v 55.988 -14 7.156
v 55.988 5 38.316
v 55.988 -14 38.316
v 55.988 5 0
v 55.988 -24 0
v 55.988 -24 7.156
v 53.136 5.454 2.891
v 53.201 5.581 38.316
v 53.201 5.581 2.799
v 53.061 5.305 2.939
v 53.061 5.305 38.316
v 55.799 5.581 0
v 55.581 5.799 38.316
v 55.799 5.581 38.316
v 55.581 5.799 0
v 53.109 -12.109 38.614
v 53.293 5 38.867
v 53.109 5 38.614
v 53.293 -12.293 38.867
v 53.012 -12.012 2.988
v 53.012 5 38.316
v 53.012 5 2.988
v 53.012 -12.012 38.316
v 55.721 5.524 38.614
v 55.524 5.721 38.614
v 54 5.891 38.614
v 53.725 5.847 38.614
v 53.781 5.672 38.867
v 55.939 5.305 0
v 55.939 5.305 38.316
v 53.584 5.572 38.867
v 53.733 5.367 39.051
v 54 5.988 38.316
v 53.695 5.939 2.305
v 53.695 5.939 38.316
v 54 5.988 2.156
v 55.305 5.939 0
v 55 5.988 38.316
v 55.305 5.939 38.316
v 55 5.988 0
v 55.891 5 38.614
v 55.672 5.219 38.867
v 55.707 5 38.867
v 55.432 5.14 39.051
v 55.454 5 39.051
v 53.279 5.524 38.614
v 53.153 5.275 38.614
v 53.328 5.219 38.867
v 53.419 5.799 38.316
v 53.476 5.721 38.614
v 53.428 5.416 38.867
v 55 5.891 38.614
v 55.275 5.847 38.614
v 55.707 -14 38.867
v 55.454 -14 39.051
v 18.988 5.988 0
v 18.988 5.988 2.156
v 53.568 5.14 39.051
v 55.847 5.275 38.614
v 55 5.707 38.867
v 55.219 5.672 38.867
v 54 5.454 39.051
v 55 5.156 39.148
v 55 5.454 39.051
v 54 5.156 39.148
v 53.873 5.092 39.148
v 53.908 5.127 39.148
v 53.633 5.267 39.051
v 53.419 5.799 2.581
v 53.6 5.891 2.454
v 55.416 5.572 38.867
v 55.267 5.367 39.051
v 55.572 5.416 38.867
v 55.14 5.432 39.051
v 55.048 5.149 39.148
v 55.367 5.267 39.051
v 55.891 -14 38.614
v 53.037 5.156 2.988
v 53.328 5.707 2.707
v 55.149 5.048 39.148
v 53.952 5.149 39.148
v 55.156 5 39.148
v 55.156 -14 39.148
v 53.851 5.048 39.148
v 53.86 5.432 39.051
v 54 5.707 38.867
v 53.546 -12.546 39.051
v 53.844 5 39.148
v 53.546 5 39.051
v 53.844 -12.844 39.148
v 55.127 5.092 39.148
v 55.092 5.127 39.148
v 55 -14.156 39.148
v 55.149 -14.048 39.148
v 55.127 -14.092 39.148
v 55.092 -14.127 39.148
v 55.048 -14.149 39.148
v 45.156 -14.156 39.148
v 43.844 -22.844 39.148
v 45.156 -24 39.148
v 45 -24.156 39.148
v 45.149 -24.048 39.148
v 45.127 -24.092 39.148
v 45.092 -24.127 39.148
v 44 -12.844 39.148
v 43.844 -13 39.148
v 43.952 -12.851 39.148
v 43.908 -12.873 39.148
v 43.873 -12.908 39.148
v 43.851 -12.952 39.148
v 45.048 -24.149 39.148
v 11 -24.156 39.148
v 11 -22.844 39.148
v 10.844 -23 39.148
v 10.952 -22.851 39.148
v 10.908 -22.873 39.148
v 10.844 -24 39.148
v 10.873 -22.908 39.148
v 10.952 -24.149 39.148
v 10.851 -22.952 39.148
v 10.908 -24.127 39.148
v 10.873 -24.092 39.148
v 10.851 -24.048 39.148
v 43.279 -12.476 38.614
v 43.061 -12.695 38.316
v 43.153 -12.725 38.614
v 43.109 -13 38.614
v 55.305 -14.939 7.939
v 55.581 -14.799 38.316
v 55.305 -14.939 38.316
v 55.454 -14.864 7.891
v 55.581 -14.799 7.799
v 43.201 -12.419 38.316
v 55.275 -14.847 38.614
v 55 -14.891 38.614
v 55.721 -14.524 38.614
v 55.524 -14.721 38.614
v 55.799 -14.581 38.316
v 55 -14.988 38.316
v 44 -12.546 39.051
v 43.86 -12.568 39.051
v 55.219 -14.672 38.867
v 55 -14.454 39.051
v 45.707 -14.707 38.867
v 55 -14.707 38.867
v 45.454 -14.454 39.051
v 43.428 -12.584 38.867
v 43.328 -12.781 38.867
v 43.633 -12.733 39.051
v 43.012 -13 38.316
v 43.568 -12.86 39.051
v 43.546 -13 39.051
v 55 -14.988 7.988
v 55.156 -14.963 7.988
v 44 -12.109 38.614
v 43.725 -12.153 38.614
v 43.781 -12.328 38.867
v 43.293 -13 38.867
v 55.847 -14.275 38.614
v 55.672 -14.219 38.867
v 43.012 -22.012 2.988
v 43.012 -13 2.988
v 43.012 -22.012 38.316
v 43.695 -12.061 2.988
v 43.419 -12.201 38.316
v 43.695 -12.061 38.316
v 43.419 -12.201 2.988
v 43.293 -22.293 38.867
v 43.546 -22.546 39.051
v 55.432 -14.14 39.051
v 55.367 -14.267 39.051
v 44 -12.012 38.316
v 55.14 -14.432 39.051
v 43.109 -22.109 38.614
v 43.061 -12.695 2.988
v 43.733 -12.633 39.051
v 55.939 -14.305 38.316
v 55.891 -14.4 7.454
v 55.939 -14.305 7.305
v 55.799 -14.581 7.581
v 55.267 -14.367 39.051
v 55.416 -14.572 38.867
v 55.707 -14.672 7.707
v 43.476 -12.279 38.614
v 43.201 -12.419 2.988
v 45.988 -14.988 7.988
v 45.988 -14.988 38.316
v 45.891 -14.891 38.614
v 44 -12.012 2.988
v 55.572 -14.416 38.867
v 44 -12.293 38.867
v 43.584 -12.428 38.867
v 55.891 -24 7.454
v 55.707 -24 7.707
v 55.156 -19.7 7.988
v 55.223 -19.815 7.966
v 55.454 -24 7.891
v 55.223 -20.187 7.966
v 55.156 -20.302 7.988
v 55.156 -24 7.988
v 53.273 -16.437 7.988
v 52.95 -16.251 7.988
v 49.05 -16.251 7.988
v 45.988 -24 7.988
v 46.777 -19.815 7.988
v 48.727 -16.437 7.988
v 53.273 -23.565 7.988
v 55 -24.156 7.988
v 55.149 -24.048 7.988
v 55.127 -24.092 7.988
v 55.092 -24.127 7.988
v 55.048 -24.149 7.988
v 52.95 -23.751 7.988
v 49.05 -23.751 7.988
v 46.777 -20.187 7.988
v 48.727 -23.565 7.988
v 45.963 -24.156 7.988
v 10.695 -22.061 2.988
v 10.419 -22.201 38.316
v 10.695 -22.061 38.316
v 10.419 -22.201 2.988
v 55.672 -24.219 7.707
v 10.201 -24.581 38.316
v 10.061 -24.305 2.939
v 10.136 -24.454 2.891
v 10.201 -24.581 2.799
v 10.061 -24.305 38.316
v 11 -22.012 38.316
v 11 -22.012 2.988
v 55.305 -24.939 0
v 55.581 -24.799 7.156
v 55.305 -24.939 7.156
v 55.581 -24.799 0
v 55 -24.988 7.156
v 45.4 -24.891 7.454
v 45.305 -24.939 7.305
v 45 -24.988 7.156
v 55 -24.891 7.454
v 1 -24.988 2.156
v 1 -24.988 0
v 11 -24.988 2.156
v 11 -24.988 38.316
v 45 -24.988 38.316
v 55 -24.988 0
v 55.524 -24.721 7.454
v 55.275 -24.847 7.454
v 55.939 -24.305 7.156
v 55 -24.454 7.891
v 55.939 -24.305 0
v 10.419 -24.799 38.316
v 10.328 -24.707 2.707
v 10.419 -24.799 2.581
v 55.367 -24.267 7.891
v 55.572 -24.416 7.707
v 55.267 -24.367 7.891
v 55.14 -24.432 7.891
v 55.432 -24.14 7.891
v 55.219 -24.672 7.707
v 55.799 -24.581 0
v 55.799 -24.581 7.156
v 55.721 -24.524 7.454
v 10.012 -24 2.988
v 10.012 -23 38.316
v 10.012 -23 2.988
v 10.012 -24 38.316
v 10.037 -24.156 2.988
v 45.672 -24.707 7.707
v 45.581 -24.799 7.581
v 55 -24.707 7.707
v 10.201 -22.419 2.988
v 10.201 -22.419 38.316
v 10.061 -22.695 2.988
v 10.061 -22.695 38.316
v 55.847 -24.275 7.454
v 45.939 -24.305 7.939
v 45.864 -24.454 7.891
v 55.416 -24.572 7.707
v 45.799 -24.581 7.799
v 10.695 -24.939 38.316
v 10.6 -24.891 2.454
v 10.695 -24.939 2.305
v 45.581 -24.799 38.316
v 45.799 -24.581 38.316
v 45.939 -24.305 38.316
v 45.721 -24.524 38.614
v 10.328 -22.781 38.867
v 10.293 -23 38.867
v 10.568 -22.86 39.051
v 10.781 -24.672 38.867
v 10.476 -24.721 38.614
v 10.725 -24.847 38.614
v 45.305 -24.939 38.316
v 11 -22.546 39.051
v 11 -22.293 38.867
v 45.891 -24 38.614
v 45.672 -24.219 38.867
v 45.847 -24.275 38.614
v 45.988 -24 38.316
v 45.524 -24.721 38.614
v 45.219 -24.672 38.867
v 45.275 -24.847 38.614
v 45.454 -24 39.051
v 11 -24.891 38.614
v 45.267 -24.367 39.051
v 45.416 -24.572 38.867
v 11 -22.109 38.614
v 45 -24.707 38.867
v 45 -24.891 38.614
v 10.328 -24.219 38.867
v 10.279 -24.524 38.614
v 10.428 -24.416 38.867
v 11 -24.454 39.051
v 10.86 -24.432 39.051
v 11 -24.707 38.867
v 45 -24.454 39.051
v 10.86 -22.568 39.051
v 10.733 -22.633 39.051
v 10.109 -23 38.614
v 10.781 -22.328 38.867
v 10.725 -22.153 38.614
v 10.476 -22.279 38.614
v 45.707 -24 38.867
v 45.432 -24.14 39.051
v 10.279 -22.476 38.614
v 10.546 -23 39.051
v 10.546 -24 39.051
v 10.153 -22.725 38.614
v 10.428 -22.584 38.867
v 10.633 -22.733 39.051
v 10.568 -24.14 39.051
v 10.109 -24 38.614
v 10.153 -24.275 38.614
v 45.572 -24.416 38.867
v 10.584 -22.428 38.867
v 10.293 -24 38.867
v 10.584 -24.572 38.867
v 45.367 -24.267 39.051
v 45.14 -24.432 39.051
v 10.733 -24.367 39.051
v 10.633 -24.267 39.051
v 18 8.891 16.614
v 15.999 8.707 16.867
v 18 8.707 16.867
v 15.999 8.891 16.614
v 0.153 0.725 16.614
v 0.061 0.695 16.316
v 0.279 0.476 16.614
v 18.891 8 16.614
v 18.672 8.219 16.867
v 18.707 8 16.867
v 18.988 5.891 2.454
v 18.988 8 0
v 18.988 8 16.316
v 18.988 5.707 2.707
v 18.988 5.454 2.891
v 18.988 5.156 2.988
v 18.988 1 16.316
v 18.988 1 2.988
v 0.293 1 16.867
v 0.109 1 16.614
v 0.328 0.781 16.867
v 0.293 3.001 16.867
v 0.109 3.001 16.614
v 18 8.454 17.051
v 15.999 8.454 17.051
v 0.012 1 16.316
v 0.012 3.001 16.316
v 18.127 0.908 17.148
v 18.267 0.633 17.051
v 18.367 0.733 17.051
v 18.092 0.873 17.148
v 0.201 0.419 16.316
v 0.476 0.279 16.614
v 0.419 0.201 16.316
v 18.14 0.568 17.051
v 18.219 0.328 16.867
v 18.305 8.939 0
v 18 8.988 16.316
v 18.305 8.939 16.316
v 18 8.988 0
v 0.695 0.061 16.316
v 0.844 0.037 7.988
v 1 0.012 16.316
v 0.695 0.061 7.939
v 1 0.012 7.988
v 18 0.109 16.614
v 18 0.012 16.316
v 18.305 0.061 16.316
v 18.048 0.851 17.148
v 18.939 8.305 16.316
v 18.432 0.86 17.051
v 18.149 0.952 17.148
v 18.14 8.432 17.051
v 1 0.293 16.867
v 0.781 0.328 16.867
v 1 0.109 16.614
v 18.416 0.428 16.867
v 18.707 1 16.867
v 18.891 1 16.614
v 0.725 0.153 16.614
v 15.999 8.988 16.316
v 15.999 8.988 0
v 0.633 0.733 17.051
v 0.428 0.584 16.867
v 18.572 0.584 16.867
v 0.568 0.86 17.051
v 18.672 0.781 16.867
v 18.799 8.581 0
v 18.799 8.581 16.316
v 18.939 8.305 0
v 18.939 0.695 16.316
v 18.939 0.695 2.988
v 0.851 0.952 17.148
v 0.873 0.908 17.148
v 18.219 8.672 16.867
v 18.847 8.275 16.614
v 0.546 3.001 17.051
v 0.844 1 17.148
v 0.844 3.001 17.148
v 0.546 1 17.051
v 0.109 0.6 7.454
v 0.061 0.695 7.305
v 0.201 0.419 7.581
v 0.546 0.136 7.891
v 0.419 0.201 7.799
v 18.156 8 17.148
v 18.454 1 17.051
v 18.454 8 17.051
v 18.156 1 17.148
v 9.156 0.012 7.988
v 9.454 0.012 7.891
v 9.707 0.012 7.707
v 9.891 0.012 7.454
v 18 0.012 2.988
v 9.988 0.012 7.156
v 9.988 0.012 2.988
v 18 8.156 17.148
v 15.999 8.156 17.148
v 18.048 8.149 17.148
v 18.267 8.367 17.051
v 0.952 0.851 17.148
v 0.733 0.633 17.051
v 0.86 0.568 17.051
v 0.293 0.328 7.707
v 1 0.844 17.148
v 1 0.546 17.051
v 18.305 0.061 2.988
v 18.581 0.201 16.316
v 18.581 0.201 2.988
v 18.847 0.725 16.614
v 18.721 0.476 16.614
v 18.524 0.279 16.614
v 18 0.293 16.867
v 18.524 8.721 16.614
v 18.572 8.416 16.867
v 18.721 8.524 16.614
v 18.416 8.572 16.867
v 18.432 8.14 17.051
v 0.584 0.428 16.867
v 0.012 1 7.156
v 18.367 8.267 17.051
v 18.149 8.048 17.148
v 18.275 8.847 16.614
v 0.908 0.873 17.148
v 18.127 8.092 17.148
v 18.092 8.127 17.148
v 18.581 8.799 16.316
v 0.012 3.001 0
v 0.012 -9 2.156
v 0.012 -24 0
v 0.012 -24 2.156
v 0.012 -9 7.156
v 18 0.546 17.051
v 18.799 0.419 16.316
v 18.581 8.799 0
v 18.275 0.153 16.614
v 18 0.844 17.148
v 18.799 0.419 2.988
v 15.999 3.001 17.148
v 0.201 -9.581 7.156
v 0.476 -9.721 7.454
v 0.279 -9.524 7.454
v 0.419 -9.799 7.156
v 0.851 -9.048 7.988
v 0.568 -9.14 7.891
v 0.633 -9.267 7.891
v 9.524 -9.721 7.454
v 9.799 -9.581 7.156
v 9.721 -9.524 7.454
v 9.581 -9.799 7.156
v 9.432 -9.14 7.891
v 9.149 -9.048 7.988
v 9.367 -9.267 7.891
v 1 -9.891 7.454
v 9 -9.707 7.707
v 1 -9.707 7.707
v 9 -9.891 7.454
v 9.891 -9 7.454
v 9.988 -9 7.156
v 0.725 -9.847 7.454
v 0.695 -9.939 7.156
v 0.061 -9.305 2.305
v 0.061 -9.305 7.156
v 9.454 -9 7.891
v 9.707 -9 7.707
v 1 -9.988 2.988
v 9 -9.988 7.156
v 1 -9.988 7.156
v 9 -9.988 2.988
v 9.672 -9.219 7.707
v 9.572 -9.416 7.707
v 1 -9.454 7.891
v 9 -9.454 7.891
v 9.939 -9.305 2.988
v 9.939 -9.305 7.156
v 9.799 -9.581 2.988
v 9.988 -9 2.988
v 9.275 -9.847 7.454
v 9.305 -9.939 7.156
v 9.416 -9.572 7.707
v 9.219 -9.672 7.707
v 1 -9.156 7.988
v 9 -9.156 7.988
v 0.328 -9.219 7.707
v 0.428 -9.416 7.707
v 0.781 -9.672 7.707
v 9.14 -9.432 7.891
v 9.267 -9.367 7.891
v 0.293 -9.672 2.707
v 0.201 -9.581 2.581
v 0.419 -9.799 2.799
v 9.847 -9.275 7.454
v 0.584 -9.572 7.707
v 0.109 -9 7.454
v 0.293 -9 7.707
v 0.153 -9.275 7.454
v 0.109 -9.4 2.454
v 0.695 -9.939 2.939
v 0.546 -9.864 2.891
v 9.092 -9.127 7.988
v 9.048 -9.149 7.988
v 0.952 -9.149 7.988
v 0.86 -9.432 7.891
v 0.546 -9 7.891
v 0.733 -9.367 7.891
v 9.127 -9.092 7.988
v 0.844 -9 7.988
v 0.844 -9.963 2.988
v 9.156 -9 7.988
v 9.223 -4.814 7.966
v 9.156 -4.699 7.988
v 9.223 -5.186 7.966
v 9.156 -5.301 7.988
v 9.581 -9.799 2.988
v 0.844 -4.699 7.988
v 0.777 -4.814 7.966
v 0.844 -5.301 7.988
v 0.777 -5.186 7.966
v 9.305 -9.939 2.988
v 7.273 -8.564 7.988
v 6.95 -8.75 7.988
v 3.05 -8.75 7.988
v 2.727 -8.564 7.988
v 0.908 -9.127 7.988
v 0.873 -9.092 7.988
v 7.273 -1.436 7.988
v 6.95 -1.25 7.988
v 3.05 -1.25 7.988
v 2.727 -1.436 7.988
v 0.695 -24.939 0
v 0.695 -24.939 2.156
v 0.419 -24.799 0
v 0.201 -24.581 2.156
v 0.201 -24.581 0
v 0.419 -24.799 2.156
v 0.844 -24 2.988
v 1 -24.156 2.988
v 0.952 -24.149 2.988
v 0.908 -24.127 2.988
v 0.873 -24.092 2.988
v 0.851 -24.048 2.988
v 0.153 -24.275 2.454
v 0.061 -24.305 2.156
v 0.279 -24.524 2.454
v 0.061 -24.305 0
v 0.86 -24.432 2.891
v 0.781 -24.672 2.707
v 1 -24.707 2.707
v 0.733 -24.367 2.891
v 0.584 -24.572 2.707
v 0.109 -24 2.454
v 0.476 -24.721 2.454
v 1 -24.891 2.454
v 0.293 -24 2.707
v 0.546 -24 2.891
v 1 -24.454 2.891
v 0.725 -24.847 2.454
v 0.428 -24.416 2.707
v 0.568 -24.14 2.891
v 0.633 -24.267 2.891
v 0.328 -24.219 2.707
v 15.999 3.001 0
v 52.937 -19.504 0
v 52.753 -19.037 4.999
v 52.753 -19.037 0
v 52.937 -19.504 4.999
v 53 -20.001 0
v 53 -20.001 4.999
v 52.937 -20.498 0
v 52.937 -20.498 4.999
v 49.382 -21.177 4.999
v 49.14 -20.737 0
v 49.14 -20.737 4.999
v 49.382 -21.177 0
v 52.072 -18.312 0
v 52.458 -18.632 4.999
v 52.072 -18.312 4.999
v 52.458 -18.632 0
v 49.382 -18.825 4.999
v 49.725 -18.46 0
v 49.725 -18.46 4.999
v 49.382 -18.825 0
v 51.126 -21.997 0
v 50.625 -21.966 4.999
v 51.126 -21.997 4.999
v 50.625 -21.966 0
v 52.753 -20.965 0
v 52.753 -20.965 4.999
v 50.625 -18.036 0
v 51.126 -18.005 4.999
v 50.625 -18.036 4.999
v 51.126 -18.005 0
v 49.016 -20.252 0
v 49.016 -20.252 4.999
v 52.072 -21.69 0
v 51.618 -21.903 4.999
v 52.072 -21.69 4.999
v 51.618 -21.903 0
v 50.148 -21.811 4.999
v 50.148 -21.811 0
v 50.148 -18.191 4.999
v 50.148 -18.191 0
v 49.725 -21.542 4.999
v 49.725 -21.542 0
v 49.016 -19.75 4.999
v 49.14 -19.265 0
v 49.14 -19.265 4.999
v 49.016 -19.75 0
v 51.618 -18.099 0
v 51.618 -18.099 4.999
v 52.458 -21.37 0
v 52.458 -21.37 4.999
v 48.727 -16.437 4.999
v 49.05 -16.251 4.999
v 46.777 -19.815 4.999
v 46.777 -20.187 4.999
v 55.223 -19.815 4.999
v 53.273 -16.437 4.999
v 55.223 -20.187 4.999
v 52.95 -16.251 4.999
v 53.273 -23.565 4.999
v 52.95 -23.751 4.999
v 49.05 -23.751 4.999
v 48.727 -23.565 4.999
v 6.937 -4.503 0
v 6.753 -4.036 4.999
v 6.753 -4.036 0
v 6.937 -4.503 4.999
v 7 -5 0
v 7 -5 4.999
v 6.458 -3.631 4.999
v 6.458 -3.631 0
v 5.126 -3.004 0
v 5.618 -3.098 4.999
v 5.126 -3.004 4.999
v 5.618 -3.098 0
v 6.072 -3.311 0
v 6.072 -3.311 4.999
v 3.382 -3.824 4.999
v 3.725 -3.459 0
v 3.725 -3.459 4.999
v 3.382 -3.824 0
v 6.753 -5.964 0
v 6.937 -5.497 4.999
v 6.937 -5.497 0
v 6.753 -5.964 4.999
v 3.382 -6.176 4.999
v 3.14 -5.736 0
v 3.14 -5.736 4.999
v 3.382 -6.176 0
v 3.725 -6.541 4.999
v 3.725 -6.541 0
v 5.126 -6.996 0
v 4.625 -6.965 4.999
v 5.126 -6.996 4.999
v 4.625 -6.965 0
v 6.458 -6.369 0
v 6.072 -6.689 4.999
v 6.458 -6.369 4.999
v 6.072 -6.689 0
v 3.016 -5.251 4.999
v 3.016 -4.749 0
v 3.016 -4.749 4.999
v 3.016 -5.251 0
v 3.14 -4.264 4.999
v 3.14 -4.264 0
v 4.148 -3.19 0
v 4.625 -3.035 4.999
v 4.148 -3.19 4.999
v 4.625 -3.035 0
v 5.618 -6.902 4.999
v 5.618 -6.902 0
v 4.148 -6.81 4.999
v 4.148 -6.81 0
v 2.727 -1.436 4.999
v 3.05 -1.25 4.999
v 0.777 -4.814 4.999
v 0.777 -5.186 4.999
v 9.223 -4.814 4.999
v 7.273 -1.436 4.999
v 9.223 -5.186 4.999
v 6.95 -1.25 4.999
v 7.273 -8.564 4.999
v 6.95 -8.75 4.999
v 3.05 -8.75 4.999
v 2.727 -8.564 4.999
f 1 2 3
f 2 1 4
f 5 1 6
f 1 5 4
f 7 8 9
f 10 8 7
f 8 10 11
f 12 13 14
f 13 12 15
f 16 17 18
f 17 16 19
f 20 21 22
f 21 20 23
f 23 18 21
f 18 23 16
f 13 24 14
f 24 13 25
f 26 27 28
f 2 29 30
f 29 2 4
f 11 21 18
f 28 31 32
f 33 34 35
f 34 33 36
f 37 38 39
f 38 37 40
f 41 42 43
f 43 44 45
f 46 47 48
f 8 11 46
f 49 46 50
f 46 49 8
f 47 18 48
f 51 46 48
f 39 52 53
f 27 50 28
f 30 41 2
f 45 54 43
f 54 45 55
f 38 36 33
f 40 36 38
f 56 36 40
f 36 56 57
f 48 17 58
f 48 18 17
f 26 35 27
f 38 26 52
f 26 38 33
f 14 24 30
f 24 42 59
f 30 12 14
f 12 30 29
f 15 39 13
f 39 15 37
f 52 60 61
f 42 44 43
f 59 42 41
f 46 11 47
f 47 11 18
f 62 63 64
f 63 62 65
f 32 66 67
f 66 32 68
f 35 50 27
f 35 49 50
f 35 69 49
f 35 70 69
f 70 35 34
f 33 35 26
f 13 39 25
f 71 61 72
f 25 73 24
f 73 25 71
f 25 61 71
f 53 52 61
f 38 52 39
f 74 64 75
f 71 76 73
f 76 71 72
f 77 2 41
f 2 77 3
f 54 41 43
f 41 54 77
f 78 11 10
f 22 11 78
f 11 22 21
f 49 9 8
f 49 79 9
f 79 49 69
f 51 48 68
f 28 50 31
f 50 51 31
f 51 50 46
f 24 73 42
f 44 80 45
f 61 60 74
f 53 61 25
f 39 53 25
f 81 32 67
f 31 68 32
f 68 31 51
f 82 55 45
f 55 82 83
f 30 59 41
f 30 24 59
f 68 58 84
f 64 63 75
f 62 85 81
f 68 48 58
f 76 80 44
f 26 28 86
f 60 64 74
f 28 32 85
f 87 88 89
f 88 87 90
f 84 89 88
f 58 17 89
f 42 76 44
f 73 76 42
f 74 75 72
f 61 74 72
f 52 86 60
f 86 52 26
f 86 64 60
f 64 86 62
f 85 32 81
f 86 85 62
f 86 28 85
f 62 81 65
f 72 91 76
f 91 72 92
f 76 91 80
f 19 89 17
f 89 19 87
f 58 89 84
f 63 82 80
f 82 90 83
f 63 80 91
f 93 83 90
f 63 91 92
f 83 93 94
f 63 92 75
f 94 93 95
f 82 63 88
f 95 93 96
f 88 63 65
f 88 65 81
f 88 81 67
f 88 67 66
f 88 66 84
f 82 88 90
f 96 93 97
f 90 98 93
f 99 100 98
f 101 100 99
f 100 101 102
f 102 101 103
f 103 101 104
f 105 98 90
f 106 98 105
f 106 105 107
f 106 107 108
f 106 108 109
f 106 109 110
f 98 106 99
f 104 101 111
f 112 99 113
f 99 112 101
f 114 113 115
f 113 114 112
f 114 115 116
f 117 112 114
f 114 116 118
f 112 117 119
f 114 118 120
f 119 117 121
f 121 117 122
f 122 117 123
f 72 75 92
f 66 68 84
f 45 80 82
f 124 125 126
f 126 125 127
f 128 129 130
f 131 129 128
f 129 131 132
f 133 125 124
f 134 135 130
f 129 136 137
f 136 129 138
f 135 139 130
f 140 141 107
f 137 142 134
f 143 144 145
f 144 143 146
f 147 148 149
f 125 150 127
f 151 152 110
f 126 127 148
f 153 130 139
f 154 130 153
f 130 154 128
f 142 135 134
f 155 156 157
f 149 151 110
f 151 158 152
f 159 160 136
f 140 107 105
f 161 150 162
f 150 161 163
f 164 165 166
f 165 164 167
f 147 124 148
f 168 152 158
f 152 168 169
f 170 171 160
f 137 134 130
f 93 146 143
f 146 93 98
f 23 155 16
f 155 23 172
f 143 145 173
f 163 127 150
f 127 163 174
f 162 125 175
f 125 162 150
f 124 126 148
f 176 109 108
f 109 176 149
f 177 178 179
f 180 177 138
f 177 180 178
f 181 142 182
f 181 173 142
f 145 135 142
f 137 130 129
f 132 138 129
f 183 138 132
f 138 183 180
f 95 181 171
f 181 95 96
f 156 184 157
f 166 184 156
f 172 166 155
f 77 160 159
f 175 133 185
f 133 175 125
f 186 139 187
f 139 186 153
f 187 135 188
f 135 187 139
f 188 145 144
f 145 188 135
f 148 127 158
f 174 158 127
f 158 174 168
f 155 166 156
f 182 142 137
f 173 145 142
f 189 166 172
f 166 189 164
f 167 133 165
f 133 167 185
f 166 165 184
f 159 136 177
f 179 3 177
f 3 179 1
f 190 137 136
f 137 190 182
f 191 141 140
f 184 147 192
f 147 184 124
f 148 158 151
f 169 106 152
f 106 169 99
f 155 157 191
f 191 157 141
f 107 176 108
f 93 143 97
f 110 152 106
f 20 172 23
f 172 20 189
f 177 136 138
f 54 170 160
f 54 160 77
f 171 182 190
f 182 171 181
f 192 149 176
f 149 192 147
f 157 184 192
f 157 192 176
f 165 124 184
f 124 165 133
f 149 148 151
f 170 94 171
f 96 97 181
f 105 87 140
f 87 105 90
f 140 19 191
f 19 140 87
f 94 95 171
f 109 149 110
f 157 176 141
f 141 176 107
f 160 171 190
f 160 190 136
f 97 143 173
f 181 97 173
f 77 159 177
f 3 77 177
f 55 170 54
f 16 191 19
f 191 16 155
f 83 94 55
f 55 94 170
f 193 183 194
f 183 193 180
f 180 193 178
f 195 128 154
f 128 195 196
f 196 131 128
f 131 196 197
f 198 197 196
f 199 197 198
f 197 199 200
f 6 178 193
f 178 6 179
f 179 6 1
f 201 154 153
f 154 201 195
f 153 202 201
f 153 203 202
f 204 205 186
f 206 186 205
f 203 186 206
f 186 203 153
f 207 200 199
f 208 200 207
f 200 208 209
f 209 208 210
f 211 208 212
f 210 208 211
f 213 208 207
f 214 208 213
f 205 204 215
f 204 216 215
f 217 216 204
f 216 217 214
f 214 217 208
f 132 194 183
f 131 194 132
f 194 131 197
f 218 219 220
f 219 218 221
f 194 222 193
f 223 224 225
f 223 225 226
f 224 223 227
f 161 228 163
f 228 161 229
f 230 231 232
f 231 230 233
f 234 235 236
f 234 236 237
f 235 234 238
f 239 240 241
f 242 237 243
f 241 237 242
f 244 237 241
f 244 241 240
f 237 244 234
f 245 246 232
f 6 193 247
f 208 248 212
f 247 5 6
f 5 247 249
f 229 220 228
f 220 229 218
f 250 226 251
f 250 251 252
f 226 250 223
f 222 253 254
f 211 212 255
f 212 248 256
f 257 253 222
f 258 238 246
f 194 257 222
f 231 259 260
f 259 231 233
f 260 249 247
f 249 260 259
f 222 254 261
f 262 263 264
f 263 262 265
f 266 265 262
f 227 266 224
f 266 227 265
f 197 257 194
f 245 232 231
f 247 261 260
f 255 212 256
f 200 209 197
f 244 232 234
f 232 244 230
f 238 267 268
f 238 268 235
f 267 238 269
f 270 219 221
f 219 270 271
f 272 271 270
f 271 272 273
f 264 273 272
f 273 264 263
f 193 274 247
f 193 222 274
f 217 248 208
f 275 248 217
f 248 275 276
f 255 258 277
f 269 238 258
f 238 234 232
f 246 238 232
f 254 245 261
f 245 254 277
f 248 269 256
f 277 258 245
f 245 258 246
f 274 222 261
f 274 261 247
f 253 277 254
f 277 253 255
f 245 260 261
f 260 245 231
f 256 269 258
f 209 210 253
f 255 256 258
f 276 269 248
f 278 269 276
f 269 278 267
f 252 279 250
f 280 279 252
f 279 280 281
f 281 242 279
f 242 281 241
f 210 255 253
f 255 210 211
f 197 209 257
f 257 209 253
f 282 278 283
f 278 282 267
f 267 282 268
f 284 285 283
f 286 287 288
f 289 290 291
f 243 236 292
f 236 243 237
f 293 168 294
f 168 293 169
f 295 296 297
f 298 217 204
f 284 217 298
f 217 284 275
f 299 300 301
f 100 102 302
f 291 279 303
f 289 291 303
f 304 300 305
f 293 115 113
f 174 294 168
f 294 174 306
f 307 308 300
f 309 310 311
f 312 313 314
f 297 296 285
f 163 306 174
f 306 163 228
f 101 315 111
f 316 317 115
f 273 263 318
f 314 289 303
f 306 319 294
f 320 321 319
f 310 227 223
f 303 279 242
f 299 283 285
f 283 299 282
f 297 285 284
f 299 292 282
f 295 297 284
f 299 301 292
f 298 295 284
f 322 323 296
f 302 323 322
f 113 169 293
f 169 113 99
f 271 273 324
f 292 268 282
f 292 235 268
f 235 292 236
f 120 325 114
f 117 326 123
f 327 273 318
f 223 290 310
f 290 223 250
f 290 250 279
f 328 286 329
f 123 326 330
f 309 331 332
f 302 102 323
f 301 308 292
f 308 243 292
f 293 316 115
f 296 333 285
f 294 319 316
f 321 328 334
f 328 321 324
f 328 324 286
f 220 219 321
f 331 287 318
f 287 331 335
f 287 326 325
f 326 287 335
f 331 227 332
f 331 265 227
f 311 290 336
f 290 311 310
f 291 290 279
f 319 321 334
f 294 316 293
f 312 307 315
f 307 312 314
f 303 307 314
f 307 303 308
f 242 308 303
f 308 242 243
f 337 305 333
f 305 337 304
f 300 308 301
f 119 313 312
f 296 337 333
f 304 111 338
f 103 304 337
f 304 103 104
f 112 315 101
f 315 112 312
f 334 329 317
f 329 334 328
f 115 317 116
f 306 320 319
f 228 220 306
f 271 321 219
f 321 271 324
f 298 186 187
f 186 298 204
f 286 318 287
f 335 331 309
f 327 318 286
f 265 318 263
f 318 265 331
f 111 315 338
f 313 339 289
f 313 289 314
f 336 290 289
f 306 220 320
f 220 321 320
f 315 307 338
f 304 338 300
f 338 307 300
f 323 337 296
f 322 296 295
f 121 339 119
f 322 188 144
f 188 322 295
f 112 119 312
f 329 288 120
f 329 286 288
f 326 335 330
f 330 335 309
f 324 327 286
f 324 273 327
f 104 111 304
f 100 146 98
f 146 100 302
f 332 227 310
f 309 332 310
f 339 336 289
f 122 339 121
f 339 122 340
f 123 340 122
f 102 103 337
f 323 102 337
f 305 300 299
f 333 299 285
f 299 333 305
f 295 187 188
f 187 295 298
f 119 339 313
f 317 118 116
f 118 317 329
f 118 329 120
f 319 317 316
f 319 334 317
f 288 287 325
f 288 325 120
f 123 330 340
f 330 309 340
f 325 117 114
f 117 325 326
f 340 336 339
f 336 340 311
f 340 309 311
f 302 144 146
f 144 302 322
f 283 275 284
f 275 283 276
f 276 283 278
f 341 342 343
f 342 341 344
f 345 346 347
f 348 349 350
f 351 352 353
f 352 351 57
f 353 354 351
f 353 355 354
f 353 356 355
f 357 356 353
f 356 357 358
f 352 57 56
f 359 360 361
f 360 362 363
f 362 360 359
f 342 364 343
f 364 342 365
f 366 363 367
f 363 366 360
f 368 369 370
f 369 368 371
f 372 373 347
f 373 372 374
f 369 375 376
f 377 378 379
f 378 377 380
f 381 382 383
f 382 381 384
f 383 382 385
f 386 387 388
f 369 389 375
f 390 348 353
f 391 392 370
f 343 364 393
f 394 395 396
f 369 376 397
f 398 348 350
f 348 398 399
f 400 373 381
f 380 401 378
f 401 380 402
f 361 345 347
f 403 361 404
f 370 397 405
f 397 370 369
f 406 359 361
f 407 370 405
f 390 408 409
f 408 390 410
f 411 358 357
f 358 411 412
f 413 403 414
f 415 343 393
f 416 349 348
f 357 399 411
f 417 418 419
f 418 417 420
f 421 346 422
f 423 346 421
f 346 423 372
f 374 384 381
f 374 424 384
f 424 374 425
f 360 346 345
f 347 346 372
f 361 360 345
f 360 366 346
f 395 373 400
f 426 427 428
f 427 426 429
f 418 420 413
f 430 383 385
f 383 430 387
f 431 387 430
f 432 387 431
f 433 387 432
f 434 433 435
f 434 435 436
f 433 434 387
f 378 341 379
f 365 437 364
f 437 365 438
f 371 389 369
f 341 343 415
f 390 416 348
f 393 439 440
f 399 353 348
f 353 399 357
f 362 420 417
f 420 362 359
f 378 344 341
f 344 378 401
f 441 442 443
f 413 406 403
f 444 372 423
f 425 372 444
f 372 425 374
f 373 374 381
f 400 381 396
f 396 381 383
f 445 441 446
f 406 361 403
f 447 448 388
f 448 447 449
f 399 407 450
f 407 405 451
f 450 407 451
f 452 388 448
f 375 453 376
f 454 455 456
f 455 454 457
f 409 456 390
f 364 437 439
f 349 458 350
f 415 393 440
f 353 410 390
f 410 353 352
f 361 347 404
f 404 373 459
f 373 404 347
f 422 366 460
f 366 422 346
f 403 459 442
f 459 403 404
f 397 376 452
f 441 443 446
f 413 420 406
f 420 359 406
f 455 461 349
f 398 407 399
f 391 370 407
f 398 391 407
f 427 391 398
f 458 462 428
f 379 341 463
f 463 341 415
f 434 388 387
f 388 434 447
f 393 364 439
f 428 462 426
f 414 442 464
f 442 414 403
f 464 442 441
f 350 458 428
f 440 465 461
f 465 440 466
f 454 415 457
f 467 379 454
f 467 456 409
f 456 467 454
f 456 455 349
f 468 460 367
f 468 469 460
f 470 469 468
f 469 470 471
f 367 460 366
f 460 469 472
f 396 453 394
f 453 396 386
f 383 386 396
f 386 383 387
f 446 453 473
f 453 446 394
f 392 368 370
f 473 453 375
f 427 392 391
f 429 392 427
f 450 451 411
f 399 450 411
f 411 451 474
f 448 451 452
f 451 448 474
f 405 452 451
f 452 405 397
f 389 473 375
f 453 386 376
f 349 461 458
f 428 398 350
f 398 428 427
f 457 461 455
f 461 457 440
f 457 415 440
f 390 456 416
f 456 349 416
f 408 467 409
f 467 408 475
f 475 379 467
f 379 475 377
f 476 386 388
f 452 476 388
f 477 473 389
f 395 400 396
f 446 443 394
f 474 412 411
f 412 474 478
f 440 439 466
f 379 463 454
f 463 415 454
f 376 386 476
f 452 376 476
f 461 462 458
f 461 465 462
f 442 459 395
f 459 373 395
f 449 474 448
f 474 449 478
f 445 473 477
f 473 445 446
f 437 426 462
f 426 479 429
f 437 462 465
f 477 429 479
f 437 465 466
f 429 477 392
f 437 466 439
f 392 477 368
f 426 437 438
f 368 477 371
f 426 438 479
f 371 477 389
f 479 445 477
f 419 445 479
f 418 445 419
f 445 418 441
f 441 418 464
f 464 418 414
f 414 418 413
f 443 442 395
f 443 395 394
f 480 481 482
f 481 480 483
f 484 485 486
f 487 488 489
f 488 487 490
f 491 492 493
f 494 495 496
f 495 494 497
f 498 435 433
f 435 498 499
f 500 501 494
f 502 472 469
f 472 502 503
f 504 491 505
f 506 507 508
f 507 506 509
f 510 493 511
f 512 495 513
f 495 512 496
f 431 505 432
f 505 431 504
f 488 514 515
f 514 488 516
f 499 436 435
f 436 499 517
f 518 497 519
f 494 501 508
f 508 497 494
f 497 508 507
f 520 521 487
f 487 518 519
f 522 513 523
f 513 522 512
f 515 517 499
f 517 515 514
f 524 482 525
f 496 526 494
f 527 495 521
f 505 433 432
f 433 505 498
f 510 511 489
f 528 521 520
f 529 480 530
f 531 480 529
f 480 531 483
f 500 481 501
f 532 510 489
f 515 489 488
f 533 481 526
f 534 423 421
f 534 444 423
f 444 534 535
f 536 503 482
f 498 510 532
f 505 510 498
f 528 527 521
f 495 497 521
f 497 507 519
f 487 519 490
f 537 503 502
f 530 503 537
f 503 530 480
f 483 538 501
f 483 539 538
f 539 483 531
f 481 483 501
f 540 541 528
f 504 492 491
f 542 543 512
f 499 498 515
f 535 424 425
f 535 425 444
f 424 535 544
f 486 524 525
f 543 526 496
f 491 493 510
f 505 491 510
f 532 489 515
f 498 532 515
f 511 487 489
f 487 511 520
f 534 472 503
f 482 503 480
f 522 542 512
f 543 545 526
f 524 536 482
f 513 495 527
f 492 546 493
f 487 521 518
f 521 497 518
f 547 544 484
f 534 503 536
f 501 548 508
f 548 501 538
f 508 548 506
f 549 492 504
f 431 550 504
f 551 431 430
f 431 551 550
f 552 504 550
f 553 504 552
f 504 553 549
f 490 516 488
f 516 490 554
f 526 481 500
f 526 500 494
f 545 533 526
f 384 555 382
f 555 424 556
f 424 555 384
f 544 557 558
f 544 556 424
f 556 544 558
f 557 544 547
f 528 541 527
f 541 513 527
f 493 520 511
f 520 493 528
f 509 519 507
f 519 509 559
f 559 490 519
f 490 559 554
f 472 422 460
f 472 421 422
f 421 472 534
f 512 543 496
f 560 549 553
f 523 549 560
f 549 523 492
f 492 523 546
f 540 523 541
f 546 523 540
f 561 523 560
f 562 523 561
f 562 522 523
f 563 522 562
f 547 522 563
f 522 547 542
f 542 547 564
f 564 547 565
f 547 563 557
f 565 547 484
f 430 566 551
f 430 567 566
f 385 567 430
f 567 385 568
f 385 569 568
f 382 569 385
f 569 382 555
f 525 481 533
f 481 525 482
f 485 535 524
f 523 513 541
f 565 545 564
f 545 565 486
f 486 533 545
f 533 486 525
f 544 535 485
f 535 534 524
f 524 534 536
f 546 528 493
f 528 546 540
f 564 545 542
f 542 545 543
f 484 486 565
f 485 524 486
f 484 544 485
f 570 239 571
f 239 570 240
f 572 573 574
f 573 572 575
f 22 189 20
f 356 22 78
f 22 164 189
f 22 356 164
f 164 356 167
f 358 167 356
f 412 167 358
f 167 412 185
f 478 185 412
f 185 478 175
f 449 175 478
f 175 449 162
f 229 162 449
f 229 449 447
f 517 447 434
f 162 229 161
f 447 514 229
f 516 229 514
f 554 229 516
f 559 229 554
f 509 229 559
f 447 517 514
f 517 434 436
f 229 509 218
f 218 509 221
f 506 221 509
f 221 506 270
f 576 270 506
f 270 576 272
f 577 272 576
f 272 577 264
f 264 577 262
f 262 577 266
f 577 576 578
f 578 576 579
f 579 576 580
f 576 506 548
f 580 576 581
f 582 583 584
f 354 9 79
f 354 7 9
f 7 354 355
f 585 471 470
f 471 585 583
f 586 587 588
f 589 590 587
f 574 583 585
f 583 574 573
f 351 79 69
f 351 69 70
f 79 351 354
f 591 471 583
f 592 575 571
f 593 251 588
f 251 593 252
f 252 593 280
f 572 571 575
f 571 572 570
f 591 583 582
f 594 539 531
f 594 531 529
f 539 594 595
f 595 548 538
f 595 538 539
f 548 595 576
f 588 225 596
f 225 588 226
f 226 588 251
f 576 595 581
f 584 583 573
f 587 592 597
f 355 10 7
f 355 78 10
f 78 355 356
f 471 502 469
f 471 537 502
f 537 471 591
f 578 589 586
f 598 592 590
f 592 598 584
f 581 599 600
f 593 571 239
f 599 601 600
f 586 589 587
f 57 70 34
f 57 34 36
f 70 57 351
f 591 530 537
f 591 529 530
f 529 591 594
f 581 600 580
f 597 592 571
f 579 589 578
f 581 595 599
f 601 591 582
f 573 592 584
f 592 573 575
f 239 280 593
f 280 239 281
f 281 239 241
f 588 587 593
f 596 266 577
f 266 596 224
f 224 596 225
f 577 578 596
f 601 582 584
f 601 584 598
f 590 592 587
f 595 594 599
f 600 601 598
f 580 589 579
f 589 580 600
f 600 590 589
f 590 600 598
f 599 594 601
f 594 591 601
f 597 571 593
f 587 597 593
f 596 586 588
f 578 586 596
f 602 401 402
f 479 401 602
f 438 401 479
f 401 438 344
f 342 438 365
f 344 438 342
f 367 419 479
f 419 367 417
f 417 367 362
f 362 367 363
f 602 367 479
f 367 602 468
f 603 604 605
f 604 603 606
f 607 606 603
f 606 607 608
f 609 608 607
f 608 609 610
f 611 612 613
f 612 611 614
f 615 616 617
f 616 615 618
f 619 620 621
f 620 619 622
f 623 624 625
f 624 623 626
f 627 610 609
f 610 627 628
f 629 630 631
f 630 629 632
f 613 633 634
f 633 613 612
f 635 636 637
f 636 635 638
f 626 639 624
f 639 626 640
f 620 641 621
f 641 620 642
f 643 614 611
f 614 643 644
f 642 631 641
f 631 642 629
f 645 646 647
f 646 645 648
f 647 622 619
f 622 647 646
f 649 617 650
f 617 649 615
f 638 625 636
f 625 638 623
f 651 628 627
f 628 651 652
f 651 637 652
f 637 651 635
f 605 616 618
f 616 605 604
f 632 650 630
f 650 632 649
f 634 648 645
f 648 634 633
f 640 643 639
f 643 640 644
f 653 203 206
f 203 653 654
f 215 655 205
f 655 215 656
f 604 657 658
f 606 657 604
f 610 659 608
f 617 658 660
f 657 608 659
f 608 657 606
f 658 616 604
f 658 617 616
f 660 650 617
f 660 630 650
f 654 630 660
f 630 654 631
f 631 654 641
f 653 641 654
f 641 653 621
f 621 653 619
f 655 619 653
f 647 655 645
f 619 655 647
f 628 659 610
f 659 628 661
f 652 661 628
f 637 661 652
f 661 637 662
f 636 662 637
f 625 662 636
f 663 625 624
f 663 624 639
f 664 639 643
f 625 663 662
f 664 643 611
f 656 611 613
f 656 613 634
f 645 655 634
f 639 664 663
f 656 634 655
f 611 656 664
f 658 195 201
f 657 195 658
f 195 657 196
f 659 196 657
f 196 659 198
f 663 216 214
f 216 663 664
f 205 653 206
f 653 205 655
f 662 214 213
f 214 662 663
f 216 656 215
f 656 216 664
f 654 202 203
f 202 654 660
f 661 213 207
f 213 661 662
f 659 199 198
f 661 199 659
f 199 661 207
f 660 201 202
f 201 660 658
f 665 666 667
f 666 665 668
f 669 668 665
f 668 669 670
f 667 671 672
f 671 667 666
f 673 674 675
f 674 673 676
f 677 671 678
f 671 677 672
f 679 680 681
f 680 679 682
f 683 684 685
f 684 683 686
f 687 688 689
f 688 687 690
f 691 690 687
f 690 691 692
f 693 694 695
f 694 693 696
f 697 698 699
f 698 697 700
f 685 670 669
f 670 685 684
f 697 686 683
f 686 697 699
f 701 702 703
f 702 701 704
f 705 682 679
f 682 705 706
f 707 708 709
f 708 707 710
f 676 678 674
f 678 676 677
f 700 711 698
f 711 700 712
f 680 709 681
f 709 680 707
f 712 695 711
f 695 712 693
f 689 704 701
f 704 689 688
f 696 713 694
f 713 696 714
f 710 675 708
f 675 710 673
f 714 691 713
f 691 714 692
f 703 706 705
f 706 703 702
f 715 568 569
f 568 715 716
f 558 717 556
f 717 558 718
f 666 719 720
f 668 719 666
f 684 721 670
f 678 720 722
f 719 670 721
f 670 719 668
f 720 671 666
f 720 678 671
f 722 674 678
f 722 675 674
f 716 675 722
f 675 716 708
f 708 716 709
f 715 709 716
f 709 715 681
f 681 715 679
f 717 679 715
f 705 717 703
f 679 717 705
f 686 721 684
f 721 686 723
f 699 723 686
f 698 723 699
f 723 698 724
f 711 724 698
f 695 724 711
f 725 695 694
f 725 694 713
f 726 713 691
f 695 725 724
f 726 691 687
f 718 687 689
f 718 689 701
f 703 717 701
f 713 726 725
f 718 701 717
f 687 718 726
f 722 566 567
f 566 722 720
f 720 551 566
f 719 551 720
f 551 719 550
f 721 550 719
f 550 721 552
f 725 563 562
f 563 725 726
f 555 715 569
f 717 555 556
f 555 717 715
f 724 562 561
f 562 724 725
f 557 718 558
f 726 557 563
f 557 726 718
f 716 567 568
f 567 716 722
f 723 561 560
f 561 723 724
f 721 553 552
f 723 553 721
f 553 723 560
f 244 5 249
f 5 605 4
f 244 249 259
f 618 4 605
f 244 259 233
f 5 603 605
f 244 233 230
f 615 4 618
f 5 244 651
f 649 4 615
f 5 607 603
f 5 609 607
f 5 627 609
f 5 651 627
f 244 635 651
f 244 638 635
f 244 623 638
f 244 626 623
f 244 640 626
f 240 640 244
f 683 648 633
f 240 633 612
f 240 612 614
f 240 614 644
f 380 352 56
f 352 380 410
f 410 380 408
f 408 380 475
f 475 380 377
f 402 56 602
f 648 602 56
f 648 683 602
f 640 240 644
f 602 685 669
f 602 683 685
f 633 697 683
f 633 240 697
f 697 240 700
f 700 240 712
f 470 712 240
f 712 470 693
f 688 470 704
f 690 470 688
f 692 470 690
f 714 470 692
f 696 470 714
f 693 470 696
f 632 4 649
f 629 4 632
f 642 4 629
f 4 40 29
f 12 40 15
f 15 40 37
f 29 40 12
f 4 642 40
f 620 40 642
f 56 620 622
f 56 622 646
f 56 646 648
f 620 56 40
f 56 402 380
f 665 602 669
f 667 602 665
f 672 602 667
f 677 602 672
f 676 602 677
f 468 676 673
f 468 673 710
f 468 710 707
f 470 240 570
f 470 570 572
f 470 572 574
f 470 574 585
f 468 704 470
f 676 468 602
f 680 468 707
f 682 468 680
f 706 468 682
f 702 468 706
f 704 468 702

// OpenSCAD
y_overlap=6;
y_channel=25;
x_outer=6;
x_channel=40;
xy_screw=10;
z_case=39.16;
z_top=3;
wall=3;
b_rad=2;
null=0.001;

module nuthole(height) {
    translate([0,0,1.5])
    hull() {
        w_nut=3.9;
                          cube([w_nut, 7.5, height], center=true);
        rotate([0,0,120]) cube([w_nut, 7.5, height], center=true);
        rotate([0,0,240]) cube([w_nut, 7.5, height], center=true);
    }
}

difference() {
union() {
    // over case
    minkowski() {
        translate([b_rad/2, b_rad/2,0])
        cube([x_outer+xy_screw+wall-b_rad,
              y_overlap+wall-b_rad,
              z_case+z_top-b_rad/2-25]);
        sphere(d=b_rad, $fn=20);
    }

    // border
    minkowski() {
        union() {
            translate([xy_screw+b_rad/2, b_rad/2-y_channel, 0])
            cube([x_outer+x_channel-xy_screw-b_rad,
                  wall-b_rad,
                  z_case-b_rad/2]);
            // edge
            translate([xy_screw+b_rad/2+x_outer+x_channel-xy_screw-wall,
                       b_rad/2-y_channel, 0])
            cube([xy_screw+wall-b_rad,
                  wall+xy_screw-b_rad,
                  8-b_rad/2]);
            // edge wall left
            translate([xy_screw+b_rad/2+x_outer+x_channel-xy_screw-wall,
                       b_rad/2-y_channel, 0])
            cube([wall-b_rad,
                  wall+xy_screw-b_rad,
                  z_case-b_rad/2]);
            // edge wall
            translate([xy_screw+b_rad/2+x_outer+x_channel-xy_screw-wall,
                       b_rad/2-y_channel+xy_screw, 0])
            cube([xy_screw+wall-b_rad,
                  wall-b_rad,
                  z_case-b_rad/2]);
            // back plate
            translate([xy_screw+b_rad/2+x_outer+x_channel-wall,
                       b_rad/2-y_channel+xy_screw, 0])
            cube([wall-b_rad,
                  y_channel+y_overlap-xy_screw-b_rad,
                  z_case-b_rad/2]);
        }
        sphere(d=b_rad, $fn=20);
    }

    // left scrw hole
    minkowski() {
        translate([b_rad/2, -xy_screw+b_rad/2, 0])
        cube([xy_screw-b_rad, xy_screw+b_rad, 8-b_rad/2]);
        sphere(d=b_rad, $fn=20);
    }

    // bottom plate
    minkowski() {
        translate([b_rad/2, -y_channel+b_rad/2, 0])
        cube([x_channel+x_outer+xy_screw-b_rad,
              y_channel+y_overlap-b_rad,
              3-b_rad/2]);
        sphere(d=b_rad, $fn=20);
    }
}

// cutout case
translate([-null, wall+null, -null])
cube([x_outer+xy_screw,
      y_overlap,
      z_case]);

// hole edge
translate([xy_screw/2+x_outer+x_channel,
           xy_screw/2-y_channel-null, -null])
cylinder(z_case, d=4, $fn=25);

translate([xy_screw/2+x_outer+x_channel,
           xy_screw/2-y_channel-null, z_case/2+5-1.5-null])
nuthole(z_case);

// hole inner
translate([xy_screw/2, -xy_screw/2, -null])
cylinder(z_case, d=4, $fn=25);

translate([xy_screw/2, -xy_screw/2, z_case/2+5-1.5-null])
nuthole(z_case);

// bottom plate
translate([-500, -500, -100])
cube([1000, 1000, 100]);
}
